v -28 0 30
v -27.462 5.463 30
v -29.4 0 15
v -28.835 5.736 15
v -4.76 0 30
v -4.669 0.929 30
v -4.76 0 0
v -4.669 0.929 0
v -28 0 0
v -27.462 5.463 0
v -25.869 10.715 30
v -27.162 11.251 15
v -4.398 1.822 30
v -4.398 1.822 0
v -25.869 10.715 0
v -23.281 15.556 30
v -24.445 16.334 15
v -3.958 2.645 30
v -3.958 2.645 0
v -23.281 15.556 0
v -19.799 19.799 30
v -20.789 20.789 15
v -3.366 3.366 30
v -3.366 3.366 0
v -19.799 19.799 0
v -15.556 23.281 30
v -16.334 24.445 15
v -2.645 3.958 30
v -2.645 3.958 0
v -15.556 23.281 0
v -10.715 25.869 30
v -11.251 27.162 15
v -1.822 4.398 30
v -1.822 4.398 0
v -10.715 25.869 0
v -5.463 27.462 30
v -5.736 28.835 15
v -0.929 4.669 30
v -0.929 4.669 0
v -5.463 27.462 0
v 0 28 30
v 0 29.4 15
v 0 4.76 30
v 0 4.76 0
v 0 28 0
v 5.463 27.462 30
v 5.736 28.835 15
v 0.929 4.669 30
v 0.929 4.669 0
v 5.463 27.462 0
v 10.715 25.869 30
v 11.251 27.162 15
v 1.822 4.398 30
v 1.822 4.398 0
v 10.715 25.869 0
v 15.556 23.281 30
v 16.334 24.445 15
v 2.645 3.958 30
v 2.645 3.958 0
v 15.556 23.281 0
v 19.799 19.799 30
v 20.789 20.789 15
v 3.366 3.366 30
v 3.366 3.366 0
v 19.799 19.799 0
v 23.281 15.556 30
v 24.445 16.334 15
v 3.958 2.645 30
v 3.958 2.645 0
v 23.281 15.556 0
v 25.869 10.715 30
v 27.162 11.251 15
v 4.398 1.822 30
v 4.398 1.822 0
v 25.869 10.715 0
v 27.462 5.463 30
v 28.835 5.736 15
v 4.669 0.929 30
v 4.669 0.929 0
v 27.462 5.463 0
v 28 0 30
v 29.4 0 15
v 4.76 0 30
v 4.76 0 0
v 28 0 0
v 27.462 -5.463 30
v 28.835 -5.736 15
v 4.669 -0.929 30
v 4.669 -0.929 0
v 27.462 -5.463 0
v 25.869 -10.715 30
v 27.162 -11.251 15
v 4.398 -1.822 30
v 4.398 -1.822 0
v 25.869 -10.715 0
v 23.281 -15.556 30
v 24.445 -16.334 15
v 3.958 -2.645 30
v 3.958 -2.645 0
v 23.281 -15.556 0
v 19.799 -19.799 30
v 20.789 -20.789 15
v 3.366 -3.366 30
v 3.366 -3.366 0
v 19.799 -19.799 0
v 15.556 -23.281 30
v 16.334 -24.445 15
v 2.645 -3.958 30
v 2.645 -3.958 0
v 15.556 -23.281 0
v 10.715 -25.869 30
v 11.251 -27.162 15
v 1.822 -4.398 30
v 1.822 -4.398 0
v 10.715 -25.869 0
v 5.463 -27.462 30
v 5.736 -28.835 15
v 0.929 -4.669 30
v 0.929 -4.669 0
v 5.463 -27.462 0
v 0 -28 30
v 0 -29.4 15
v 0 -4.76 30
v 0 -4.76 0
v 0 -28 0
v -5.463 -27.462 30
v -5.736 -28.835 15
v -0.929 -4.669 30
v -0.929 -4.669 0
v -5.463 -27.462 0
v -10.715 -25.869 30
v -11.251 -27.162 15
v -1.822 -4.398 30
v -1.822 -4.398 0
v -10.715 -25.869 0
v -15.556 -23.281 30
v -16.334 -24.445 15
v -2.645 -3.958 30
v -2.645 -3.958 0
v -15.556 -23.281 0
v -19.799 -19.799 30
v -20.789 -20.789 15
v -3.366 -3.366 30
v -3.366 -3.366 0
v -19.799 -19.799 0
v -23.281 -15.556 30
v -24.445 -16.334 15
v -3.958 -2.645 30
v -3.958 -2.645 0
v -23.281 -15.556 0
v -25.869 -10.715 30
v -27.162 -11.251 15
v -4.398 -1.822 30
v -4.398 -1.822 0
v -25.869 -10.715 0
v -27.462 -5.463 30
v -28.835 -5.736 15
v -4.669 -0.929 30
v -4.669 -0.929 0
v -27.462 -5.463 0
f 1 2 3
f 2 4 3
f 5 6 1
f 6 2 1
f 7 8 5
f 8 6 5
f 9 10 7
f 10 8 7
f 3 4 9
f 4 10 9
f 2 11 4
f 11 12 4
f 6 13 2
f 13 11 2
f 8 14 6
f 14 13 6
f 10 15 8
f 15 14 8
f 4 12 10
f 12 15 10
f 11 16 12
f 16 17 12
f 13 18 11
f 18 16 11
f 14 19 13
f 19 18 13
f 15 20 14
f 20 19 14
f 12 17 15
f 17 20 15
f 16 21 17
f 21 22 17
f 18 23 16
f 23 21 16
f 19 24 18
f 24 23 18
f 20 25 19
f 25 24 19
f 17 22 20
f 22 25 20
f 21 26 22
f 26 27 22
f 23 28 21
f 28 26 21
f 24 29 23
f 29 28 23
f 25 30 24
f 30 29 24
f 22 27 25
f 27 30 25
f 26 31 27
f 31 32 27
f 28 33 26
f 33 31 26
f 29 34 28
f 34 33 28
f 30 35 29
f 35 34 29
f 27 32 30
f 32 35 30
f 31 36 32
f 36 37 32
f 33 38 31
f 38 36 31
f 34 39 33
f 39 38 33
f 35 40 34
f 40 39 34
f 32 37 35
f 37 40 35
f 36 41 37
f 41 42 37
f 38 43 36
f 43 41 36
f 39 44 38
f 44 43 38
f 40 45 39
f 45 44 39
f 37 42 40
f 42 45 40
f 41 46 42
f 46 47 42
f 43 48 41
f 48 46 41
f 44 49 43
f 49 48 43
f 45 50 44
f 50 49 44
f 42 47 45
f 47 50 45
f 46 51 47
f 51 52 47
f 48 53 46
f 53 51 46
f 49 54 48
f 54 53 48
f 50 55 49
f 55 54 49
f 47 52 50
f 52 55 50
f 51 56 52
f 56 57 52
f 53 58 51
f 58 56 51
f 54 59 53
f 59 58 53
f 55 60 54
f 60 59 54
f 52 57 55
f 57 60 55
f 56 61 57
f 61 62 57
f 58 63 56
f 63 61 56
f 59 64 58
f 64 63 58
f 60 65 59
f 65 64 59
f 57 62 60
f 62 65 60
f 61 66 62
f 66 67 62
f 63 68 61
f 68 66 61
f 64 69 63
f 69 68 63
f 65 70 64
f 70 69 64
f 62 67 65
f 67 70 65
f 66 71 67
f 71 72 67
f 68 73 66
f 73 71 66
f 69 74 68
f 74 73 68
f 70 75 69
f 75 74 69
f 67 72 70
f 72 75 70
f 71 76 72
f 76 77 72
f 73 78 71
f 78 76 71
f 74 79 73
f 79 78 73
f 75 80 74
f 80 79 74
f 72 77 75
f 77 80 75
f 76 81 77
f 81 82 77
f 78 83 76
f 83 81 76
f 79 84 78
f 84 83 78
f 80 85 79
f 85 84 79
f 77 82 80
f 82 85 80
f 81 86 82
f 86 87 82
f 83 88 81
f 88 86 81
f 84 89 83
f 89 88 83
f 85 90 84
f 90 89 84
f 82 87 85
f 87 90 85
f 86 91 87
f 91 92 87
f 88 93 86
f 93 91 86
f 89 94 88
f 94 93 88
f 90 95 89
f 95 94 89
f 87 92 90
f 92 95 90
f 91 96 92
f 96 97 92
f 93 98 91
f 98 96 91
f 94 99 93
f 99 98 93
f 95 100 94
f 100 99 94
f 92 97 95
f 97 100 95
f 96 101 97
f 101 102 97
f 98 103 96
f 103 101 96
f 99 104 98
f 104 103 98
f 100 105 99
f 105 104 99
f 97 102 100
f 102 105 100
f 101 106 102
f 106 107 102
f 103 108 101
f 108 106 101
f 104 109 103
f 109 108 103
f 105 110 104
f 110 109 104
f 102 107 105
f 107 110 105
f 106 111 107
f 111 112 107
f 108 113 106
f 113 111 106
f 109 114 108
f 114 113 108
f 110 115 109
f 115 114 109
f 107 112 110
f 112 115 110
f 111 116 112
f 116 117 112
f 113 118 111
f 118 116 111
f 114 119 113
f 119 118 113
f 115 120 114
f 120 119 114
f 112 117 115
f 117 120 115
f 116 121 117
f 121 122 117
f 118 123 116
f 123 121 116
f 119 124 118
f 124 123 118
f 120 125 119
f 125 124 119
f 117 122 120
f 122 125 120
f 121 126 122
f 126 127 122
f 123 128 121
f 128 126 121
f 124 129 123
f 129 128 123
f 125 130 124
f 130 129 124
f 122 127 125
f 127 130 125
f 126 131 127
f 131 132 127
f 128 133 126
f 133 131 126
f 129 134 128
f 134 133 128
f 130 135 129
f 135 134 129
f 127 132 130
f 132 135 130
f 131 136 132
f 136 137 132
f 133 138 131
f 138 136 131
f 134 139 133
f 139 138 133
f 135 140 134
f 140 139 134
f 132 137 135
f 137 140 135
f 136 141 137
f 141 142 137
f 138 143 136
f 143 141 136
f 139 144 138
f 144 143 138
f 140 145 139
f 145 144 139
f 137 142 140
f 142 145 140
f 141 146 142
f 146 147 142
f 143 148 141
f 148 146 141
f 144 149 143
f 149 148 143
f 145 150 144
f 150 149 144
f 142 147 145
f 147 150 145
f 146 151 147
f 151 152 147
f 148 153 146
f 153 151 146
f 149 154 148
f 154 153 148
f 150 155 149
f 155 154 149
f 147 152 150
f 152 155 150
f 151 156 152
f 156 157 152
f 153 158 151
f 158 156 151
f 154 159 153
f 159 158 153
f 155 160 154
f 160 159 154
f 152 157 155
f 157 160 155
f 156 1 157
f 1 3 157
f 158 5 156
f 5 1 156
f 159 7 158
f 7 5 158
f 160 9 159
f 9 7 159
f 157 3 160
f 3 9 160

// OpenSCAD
$fn = 32;

// ----------------------------------------------------------------------
// Belt roller: 56 mm barrel, 30 mm wide, bore 9.52 mm
// ----------------------------------------------------------------------

// --- parameters (mm) ---
bore_d = 9.52;            // bore
barrel_d = 56;            // barrel diameter
roller_w = 30;            // roller width
crown = 1.4;              // crown height at mid width

roller_profile = [[4.76, 0], [28, 0], [29.4, 15], [28, 30], [4.76, 30]];

/* the profile stays clear of the axis, so the bore comes out of the revolve */
rotate_extrude() polygon(roller_profile);
